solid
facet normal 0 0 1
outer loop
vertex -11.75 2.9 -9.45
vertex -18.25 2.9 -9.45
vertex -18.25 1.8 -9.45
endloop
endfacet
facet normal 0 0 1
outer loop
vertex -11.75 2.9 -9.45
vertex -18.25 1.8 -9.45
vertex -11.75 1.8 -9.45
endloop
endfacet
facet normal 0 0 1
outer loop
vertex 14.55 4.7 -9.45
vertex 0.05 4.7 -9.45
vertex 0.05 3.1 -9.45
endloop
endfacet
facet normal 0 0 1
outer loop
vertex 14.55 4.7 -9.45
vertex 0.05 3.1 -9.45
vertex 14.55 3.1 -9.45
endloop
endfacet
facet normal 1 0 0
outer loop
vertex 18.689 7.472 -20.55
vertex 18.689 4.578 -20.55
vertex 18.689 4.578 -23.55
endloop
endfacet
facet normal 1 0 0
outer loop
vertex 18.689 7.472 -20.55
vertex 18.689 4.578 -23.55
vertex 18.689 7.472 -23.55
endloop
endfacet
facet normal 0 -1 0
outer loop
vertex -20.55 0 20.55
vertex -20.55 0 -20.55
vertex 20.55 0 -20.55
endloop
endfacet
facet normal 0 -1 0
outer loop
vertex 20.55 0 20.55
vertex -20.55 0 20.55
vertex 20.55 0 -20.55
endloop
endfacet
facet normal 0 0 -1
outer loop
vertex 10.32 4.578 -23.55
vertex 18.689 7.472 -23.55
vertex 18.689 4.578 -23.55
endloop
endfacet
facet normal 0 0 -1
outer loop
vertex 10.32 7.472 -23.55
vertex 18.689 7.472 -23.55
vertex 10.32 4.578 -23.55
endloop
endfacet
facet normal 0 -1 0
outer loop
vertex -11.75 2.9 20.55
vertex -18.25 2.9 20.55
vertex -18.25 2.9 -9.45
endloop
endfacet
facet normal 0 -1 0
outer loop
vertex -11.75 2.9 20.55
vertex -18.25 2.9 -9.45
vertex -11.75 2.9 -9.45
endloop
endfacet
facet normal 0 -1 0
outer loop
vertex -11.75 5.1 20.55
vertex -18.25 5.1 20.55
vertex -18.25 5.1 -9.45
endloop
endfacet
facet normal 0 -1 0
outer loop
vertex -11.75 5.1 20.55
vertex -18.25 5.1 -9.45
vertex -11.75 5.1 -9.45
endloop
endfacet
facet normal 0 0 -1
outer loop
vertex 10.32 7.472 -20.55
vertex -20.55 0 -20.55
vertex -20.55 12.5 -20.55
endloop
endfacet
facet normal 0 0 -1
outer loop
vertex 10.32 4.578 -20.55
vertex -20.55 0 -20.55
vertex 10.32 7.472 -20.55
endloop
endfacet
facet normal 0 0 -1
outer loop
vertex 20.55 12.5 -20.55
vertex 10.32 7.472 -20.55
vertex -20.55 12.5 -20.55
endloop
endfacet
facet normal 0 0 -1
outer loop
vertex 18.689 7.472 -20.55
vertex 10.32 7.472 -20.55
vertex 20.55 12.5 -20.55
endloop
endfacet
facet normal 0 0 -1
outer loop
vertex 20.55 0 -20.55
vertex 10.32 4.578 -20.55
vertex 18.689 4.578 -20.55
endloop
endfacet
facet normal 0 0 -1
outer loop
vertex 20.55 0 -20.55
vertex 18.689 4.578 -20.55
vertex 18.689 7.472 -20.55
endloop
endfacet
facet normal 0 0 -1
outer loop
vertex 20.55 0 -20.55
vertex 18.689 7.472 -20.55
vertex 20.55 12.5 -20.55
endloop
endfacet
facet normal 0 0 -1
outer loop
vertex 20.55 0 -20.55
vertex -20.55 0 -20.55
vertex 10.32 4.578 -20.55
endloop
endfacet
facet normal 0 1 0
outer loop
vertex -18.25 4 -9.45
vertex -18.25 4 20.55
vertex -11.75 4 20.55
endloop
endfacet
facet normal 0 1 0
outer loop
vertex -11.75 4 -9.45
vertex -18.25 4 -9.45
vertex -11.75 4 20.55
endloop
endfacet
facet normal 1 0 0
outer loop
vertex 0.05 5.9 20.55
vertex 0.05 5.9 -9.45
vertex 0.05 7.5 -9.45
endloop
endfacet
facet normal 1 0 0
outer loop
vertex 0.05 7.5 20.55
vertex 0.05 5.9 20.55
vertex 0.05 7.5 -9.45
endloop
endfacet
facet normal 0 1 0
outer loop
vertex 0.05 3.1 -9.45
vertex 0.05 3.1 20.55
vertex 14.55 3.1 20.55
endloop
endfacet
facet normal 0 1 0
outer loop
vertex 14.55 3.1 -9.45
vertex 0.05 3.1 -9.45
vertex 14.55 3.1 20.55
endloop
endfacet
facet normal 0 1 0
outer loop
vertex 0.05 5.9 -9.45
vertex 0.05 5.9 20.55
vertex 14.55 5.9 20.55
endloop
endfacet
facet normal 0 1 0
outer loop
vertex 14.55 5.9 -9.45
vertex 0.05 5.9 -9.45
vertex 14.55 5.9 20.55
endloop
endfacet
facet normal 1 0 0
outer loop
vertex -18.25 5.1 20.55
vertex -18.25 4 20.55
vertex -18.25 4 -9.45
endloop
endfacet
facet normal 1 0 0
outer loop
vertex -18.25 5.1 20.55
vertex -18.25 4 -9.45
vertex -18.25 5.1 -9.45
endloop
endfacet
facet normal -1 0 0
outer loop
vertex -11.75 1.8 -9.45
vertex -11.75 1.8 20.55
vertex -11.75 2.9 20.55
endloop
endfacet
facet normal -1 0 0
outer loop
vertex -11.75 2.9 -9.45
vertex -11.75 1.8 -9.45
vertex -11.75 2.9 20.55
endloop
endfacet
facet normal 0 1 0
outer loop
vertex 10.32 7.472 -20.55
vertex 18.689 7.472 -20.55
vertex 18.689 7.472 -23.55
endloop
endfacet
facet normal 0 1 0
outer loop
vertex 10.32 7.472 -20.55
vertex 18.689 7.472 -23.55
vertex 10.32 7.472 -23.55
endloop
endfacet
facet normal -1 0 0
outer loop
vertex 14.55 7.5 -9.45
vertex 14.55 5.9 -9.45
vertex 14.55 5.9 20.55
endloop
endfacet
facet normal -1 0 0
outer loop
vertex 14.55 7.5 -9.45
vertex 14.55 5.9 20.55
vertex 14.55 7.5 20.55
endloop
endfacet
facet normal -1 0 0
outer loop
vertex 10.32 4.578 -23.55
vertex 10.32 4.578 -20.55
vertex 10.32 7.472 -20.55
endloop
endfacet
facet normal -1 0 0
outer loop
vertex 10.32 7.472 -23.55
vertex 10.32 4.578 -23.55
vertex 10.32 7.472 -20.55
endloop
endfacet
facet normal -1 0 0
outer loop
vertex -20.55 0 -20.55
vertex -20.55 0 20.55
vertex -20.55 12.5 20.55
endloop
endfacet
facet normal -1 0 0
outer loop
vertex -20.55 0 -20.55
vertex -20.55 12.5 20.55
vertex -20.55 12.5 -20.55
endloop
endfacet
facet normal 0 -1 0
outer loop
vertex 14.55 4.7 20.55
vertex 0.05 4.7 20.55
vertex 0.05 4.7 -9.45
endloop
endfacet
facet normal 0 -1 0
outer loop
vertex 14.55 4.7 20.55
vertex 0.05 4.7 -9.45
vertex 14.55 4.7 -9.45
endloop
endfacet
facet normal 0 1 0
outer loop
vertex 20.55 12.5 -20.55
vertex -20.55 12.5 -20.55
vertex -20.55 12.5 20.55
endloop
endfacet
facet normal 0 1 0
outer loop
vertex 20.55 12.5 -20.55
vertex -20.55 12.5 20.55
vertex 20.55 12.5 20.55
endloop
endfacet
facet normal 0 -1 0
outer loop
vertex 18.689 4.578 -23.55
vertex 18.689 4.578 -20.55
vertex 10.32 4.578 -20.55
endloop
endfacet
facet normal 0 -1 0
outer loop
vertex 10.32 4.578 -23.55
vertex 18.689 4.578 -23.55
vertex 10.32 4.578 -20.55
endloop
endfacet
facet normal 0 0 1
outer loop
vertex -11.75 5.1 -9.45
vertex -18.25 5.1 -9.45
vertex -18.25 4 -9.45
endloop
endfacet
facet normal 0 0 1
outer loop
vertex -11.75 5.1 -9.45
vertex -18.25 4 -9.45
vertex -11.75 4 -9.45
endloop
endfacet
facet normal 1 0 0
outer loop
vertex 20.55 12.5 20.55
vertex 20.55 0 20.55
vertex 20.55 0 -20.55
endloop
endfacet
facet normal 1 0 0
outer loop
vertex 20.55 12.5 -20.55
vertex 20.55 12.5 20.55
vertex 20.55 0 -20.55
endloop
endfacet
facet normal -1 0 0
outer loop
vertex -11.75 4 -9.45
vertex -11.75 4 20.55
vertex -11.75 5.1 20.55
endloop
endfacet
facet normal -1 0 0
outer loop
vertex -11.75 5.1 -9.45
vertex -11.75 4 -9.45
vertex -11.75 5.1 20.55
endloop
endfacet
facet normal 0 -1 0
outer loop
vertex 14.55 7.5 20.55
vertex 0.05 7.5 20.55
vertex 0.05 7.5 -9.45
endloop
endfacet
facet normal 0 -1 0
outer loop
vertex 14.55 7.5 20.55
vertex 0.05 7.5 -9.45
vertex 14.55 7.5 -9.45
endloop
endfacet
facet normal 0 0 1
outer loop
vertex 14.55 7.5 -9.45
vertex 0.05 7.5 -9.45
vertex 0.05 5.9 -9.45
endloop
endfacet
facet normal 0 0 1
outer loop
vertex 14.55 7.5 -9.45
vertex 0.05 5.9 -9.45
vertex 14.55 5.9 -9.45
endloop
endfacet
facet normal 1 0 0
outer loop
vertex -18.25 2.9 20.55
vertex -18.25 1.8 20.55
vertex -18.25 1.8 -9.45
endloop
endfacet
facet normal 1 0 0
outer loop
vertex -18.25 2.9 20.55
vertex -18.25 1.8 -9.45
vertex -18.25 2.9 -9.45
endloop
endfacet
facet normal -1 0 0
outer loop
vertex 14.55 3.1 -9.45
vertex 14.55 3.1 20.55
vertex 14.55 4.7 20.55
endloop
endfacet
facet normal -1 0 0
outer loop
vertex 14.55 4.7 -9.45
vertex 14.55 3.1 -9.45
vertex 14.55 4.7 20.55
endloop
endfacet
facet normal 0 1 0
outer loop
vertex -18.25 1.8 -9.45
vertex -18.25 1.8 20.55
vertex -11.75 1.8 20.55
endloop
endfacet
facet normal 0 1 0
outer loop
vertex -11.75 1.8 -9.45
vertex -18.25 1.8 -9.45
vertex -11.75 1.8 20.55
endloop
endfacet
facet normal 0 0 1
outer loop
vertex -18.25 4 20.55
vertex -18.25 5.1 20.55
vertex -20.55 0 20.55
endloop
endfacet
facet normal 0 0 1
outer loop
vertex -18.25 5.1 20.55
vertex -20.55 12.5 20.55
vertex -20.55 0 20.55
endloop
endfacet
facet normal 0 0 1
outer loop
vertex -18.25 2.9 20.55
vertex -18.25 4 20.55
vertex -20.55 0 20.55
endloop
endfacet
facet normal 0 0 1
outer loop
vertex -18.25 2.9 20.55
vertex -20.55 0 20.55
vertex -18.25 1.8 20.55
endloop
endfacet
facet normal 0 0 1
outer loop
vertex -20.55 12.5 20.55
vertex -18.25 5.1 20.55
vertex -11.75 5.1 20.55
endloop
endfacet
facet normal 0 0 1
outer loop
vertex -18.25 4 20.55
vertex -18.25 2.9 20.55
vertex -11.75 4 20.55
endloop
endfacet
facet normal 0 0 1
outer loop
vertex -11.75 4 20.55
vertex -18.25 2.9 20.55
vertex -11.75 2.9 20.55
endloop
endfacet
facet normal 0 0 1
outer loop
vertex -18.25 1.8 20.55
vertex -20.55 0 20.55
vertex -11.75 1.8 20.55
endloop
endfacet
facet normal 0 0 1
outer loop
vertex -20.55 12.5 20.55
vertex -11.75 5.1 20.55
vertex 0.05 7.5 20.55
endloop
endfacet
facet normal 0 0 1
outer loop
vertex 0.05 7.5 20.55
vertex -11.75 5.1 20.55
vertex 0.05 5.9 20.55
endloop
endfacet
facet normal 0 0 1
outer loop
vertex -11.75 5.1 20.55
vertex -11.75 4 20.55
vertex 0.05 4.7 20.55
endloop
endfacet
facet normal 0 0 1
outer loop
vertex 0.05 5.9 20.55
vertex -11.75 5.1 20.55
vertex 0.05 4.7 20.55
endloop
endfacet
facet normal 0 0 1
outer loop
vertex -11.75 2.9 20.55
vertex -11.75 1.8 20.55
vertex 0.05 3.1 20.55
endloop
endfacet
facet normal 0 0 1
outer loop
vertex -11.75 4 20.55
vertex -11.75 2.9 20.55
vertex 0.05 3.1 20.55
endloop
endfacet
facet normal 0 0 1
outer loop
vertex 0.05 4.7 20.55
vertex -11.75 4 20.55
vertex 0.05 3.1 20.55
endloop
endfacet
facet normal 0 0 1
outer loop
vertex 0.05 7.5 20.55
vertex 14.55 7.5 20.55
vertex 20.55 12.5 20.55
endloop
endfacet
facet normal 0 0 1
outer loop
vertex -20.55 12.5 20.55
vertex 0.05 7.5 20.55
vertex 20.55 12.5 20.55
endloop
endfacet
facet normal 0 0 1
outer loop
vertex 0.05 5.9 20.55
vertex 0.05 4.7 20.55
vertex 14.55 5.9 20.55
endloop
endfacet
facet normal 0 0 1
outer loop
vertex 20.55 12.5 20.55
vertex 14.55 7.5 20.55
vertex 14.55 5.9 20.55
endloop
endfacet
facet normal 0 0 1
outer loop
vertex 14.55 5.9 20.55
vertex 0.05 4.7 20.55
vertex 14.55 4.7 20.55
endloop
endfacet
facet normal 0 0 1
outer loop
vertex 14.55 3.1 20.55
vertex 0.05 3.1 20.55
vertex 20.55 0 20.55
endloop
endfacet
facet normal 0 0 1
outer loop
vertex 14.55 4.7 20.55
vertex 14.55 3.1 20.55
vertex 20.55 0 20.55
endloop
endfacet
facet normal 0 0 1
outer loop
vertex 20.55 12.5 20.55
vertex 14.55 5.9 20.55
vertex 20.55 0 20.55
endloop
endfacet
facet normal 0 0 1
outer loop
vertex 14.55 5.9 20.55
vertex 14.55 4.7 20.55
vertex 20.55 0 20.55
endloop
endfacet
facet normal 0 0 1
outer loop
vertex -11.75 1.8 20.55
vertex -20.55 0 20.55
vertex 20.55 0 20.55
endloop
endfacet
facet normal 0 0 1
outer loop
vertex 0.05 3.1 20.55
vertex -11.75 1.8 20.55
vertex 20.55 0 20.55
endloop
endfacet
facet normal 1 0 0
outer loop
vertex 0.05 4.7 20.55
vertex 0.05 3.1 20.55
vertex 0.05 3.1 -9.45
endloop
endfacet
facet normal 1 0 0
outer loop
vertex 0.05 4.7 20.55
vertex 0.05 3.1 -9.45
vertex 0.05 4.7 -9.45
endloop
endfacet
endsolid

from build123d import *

# Parameters (mm, degrees)
SKETCH1_W           = 41.1
SKETCH1_H           = 41.1
BOSS_EXTRUDE1_DEPTH = 12.5
SKETCH2_W           = 14.5
SKETCH2_H           = 1.6
SKETCH2_W_2         = 6.5
SKETCH2_H_2         = 1.1
CUT_EXTRUDE1_DEPTH  = 30
SKETCH3_W           = 8.369195437
SKETCH3_H           = 2.894608948
BOSS_EXTRUDE2_DEPTH = 3


with BuildPart() as part:
    # Sketch1 → Boss-Extrude1 (new body)
    with BuildSketch(Plane(origin=(0, 0, 0), x_dir=(1, 0, 0), z_dir=(0, 1, 0))):
        Rectangle(SKETCH1_W, SKETCH1_H)
    extrude(amount=BOSS_EXTRUDE1_DEPTH)

    # Sketch2 → Cut-Extrude1 (cut)
    with BuildSketch(Plane.XY.offset(20.55)):
        with Locations((7.3, 6.7)):
            Rectangle(SKETCH2_W, SKETCH2_H)
        with Locations((7.3, 3.9)):
            Rectangle(SKETCH2_W, SKETCH2_H)
        with Locations((-15, 4.55)):
            Rectangle(SKETCH2_W_2, SKETCH2_H_2)
        with Locations((-15, 2.35)):
            Rectangle(SKETCH2_W_2, SKETCH2_H_2)
    extrude(amount=-CUT_EXTRUDE1_DEPTH, mode=Mode.SUBTRACT)

    # Sketch3 → Boss-Extrude2 (add)
    with BuildSketch(Plane(origin=(0, 0, -20.55), x_dir=(-1, 0, 0), z_dir=(0, 0, -1))):
        with Locations((-14.504507882, 6.024959093)):
            Rectangle(SKETCH3_W, SKETCH3_H)
    extrude(amount=BOSS_EXTRUDE2_DEPTH)


solid = part.part
